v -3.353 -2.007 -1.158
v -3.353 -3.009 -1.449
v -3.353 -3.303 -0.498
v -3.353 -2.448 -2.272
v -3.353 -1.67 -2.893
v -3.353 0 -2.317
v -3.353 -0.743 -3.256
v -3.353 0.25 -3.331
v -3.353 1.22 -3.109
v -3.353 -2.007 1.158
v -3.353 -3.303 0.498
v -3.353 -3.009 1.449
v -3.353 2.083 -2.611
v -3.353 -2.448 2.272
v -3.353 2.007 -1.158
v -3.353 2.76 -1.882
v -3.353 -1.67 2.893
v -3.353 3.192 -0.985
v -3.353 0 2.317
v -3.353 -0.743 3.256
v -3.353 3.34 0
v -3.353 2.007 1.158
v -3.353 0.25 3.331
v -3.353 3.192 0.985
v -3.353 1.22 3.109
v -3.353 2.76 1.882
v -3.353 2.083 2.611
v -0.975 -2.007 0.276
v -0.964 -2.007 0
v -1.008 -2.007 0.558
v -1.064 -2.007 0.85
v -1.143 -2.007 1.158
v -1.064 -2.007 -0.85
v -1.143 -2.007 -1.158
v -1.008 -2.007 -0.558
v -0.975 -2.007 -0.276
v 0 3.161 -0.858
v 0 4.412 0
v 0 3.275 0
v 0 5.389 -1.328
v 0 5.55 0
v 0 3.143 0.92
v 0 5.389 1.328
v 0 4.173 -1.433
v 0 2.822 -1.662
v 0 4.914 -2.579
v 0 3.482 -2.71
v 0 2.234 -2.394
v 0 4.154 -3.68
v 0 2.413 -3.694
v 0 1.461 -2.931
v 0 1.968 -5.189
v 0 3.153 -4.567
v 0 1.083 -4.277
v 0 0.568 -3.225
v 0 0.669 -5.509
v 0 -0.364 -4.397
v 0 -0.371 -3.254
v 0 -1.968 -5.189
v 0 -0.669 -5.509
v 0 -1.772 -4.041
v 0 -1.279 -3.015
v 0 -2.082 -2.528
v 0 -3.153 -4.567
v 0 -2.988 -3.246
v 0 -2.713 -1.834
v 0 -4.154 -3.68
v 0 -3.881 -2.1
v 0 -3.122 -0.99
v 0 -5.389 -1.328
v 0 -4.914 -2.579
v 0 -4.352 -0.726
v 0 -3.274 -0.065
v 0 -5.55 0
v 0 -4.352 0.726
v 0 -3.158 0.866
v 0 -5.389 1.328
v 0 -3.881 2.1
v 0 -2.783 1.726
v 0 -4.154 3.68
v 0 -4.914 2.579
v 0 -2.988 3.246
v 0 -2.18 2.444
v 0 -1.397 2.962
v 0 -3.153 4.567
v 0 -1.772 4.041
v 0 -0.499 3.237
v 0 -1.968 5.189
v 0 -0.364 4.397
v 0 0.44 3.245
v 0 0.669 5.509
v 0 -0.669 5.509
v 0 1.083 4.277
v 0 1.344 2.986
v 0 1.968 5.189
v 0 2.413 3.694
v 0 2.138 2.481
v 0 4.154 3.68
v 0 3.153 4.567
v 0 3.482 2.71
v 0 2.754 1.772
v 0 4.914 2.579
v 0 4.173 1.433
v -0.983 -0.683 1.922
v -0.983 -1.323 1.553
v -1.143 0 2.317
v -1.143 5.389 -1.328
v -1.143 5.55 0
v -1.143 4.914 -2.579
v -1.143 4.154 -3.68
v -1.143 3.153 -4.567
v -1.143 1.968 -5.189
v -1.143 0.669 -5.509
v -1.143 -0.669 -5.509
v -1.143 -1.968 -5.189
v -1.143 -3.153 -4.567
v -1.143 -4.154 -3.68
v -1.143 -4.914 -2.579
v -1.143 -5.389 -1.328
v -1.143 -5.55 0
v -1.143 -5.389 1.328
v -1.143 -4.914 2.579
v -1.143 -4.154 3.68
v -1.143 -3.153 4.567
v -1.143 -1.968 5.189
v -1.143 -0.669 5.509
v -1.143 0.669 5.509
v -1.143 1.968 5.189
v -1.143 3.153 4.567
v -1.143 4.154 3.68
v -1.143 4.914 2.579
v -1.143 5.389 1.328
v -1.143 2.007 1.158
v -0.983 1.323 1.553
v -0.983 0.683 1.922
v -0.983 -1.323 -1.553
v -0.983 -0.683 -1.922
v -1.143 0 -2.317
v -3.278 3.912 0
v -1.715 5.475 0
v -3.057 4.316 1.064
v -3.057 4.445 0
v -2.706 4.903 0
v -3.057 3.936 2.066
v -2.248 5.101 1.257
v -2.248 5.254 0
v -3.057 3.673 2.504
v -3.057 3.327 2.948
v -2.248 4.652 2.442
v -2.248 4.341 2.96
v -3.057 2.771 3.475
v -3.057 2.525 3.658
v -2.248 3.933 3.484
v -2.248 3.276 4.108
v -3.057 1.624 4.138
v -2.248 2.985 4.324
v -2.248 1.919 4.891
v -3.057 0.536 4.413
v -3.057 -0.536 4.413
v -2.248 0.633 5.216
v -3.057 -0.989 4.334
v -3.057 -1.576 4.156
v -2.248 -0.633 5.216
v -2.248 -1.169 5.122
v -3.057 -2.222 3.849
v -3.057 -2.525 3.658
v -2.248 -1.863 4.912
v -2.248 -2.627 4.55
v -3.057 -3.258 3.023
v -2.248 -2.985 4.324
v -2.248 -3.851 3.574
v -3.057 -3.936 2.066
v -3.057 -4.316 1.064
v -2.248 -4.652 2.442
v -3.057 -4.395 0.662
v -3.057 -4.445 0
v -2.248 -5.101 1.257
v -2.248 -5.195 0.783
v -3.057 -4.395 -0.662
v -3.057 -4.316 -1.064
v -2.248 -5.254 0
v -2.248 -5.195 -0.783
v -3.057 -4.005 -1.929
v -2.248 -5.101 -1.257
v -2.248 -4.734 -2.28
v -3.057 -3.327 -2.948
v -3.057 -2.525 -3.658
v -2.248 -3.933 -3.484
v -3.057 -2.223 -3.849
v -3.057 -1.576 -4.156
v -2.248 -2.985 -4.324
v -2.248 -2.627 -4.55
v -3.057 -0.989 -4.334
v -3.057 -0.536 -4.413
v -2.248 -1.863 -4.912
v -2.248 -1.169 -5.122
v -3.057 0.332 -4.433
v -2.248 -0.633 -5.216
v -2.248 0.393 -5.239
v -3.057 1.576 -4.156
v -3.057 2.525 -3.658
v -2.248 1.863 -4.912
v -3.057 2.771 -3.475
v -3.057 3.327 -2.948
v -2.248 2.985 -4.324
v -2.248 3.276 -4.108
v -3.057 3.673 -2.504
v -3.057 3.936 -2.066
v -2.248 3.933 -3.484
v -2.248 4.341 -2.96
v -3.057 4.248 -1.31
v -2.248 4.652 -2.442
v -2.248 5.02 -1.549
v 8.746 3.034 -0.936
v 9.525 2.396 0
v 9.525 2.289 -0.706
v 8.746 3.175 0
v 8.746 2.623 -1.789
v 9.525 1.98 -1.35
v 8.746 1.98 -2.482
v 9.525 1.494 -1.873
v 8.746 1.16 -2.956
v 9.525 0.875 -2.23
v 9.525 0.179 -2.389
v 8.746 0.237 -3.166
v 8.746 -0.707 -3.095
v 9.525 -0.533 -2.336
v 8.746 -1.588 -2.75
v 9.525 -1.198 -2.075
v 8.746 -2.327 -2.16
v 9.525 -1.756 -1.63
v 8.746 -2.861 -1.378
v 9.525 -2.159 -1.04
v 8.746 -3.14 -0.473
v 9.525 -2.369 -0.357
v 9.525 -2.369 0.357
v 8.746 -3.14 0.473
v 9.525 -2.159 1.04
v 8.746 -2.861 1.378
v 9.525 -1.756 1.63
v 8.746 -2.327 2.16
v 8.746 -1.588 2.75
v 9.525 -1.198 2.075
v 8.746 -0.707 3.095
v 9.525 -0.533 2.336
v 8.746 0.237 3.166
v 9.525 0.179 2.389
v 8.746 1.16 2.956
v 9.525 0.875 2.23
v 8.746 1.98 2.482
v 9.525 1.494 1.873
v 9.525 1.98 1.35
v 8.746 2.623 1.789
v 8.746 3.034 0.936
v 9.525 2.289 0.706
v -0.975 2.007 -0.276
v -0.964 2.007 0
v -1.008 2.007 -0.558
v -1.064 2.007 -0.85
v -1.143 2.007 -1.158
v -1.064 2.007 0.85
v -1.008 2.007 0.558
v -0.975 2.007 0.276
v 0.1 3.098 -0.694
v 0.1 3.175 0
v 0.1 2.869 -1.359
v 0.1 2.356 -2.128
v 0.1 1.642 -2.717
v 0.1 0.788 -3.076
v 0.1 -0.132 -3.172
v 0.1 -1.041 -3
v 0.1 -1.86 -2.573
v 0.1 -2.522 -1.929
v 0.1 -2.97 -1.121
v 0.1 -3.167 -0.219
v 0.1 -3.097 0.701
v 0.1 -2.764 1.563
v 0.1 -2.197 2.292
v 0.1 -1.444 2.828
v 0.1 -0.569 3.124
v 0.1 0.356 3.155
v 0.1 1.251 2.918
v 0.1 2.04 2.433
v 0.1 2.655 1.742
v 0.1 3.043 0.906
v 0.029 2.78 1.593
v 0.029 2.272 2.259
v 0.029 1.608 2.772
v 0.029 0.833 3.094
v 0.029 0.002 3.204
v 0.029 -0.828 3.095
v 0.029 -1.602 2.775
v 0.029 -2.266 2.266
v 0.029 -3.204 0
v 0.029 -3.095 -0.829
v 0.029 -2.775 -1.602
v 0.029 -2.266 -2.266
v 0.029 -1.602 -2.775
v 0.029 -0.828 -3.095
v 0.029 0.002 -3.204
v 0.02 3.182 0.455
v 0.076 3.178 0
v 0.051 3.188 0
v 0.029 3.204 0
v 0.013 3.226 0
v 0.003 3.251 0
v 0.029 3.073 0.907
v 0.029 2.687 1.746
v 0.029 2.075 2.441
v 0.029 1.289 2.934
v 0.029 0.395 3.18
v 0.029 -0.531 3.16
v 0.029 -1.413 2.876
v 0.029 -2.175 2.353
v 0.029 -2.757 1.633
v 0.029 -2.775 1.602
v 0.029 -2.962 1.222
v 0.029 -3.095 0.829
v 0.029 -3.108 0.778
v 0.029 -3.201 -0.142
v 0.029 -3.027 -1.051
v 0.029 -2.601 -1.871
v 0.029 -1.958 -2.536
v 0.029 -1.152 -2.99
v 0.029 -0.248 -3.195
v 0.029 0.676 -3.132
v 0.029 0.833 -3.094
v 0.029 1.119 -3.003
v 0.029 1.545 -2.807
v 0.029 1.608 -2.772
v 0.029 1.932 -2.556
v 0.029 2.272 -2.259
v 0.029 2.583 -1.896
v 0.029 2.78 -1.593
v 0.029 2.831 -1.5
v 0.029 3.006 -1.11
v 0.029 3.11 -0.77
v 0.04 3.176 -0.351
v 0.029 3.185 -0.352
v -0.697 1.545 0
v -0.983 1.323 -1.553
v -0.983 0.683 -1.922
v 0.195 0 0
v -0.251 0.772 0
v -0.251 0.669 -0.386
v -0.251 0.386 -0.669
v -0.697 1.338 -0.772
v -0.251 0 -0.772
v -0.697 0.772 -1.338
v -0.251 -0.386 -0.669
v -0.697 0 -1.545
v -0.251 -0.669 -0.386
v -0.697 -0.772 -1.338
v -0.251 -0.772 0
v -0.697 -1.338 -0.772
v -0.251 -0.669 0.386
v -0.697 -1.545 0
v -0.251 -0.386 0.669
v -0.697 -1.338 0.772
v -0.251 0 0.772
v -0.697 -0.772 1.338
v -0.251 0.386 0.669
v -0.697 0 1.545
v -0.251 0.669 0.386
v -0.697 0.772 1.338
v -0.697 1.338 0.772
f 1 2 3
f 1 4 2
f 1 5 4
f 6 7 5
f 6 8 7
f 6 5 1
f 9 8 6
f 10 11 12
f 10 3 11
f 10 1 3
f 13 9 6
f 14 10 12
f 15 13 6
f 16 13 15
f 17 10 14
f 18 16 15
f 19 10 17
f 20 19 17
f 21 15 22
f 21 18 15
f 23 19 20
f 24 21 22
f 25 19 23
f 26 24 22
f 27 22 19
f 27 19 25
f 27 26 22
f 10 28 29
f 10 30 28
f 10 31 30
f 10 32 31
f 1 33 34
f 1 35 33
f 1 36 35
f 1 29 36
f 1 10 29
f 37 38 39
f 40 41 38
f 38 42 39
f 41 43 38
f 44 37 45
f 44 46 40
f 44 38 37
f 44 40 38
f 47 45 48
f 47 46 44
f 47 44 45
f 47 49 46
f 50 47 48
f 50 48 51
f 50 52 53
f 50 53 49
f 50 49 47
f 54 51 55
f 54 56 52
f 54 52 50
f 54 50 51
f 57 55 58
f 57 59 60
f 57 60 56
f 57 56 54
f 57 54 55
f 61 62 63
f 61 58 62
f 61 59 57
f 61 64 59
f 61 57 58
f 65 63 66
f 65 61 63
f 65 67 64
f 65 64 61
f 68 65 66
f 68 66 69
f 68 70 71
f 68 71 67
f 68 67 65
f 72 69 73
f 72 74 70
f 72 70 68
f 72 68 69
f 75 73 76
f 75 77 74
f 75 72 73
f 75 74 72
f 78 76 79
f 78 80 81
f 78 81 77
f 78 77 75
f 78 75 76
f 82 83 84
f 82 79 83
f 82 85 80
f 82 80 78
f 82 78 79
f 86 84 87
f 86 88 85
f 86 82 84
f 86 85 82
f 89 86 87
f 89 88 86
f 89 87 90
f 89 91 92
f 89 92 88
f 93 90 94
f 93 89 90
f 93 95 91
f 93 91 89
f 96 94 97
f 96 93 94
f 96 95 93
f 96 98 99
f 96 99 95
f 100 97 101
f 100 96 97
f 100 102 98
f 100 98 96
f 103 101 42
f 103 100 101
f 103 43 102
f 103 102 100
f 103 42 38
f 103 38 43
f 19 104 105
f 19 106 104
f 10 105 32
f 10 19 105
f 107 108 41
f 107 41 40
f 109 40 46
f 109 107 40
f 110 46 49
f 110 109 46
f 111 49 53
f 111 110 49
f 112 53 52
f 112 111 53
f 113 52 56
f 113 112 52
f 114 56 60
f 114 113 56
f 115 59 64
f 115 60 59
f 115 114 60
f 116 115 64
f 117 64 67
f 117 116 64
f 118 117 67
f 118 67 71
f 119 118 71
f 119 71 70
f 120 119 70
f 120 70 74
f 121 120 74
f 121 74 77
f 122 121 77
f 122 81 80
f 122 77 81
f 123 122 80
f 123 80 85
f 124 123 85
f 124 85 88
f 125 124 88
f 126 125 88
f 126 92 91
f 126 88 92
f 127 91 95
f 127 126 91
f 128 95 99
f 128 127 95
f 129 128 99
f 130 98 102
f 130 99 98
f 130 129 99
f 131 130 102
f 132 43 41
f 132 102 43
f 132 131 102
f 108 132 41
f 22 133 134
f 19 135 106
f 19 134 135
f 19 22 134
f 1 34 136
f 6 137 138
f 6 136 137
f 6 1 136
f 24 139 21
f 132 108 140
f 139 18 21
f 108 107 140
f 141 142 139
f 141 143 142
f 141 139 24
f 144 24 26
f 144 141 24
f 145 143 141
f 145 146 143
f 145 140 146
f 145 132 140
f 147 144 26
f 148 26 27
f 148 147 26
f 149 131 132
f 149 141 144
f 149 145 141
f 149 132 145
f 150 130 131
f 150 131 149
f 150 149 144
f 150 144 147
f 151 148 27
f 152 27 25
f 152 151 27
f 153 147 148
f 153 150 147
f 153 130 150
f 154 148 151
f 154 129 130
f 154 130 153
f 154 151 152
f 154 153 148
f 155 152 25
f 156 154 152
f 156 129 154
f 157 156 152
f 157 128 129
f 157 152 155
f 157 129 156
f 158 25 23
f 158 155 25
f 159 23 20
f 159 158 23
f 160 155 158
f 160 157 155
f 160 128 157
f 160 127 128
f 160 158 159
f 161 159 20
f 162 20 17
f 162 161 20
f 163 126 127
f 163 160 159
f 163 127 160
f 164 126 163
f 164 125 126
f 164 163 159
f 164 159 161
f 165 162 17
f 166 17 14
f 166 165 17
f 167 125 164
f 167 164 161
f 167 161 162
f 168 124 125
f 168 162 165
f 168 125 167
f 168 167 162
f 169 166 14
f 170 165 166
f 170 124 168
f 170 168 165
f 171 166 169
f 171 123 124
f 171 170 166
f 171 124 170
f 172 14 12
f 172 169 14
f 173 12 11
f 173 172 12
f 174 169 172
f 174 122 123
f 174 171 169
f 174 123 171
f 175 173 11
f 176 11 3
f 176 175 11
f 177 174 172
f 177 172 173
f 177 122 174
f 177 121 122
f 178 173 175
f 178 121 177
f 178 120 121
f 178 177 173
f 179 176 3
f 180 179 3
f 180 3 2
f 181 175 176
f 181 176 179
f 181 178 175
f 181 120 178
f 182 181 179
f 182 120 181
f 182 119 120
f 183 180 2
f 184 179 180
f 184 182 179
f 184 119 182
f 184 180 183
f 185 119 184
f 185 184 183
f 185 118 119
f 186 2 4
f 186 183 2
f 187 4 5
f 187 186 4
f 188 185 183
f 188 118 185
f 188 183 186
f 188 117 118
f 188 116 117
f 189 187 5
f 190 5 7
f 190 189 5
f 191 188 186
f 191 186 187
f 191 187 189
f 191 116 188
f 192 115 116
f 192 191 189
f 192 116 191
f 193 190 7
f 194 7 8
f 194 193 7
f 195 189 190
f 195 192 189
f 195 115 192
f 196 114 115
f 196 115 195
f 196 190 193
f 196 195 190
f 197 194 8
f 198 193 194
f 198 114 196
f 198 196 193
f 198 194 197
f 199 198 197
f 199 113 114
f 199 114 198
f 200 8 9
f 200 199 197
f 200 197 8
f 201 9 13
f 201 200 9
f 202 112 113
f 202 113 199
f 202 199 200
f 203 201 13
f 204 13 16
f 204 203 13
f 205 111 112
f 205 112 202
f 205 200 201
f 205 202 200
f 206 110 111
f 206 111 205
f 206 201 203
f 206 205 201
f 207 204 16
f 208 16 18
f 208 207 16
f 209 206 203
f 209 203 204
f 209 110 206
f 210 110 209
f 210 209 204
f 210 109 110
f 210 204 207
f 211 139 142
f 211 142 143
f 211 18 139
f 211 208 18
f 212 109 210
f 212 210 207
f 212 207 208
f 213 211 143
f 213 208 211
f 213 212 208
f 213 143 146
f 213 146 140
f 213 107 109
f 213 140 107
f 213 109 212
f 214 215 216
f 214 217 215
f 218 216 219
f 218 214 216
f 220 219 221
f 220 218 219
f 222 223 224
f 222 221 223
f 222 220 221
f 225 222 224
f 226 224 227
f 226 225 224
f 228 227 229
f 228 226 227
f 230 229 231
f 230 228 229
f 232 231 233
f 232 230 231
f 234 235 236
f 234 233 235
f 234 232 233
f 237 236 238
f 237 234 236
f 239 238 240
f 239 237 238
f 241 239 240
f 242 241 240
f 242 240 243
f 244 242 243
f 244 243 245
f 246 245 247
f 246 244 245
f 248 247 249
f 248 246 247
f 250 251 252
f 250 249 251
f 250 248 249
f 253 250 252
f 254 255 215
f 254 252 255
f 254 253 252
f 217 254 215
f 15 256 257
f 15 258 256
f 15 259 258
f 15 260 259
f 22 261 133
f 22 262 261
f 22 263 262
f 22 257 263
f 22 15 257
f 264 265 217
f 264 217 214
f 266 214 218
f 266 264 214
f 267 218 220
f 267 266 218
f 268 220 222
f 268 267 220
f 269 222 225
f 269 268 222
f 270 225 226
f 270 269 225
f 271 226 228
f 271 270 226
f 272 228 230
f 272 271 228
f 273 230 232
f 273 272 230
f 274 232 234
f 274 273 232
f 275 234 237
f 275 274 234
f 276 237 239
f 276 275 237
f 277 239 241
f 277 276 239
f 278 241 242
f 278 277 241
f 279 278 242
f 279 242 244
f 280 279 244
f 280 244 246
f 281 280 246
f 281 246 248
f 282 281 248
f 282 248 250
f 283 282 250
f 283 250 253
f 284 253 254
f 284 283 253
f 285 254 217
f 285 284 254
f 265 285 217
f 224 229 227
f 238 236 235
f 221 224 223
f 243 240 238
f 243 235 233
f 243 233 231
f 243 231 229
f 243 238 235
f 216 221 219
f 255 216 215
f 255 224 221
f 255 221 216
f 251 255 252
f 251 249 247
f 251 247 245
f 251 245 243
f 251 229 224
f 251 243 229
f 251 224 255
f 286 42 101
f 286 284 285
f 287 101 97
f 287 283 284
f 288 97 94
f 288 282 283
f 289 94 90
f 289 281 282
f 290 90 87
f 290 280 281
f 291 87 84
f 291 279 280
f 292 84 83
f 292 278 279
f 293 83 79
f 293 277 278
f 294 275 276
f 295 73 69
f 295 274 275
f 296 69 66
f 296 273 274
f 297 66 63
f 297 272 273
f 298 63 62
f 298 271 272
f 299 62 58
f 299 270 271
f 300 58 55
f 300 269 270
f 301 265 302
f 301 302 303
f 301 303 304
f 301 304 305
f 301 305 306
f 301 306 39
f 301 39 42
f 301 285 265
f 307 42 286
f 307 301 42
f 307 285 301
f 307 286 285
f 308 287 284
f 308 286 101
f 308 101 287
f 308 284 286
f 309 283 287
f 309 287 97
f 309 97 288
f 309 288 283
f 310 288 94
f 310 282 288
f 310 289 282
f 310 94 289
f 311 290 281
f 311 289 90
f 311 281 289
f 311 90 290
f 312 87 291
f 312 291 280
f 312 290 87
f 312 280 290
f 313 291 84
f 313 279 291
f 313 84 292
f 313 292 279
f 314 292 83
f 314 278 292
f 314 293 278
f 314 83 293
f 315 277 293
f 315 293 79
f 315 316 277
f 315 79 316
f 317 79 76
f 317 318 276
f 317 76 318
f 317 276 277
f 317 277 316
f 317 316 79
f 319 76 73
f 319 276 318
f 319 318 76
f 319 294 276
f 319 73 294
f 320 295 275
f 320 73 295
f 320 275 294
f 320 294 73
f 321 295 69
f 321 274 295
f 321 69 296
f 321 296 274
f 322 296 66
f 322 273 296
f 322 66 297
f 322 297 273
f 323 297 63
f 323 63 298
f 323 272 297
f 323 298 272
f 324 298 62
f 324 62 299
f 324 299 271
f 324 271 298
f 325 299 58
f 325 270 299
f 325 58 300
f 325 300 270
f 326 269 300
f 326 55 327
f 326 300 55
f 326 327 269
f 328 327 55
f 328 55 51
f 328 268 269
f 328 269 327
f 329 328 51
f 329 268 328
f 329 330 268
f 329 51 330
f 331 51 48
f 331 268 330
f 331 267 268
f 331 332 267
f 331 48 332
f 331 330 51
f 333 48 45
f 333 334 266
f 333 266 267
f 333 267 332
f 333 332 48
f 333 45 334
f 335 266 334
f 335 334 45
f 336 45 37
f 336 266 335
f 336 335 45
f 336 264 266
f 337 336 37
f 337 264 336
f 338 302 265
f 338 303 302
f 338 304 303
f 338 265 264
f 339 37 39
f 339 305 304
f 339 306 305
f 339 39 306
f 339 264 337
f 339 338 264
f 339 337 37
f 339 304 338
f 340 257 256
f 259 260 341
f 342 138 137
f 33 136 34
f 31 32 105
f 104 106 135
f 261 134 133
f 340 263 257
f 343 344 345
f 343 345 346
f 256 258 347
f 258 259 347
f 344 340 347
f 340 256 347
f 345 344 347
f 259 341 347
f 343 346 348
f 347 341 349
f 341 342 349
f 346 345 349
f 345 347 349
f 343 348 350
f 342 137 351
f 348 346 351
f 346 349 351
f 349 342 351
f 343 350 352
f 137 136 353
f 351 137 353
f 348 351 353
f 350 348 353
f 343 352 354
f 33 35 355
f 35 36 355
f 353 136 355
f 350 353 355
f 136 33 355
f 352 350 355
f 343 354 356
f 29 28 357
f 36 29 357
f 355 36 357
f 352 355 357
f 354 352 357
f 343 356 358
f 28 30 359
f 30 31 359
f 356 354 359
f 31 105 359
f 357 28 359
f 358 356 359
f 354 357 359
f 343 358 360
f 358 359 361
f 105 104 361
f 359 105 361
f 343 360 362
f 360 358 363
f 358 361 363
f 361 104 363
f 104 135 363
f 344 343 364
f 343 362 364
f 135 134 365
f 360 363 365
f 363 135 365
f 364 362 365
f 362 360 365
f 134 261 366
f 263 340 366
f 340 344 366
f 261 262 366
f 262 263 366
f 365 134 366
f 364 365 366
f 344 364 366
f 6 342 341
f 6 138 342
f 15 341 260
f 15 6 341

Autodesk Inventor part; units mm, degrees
ref_plane "YZ Plane" through (0, 0, 0) normal (1, 0, 0) x (0, 1, 0)
ref_plane "XZ Plane" through (0, 0, 0) normal (0, 1, 0) x (-1, 0, 0)
sketch "Sketch1" plane through (0, 0, 0) normal (0, 0, 1) x (1, 0, 0)
  line L0 (0.1947, 0) -> (9.525, 0)
  line L1 (9.525, 0) -> (9.525, 3.175)
  line L2 (9.525, 3.175) -> (2.4132, 3.175)
  line L3 (2.4132, 3.175) -> (0.0001, 3.175)
  line L4 (0.0001, 3.175) -> (0, 3.175)
  line L5 (0, 3.175) -> (0, 5.5499)
  line L6 (0, 5.5499) -> (-3.3528, 5.5499)
  line L7 (-3.3528, 5.5499) -> (-3.3528, 2.317)
  line L8 (-3.3528, 2.317) -> (-1.143, 2.317)
  line L9 (-1.143, 2.317) -> (0.1947, 0)
  line L10 (-5.9284, 0) -> (12.1006, 0) projected
  line L11 (0, -1.11) -> (0, 6.6599) projected
  line L12 (2.4132, 3.175) -> (0, 3.175) construction
  dimension "d1" = 7.1118
  dimension "d2" = 2.4131
  dimension "d3" = 3.3528
  dimension "d4" = 2.2098
  dimension "d5" = 60
  dimension "d6" = 6.35
  dimension "d7" = 6.35
  dimension "d8" = 4.634
  dimension "d9" = 11.0998
  dimension "d26" = 9.525
revolve "Body" add sketch "Sketch1" angle 360 about axis through (0.1947, 0, 0) along (1, 0, 0) contours L9 L11 L3 L2 L1 L0 | L9 L8 L7 L6 L5 L11
sketch "Sketch2" plane through (-3.3528, 0, 0) normal (-1, 0, 0) x (0, 0, 1)
  circle A0 centre (0, 0) radius 2.317 projected
  line L0 (0, -7.7699) -> (0, 7.7699) projected
  line L1 (-7.7699, 0) -> (7.7699, 0) projected
  line L2 (2.317, 0) -> (1.1585, -2.0066)
  line L3 (1.1585, -2.0066) -> (-1.1585, -2.0066)
  line L4 (-1.1585, -2.0066) -> (-2.317, 0)
  line L5 (-2.317, 0) -> (-1.1585, 2.0066)
  line L6 (-1.1585, 2.0066) -> (1.1585, 2.0066)
  line L7 (1.1585, 2.0066) -> (2.317, 0)
extrude "Slot" add sketch "Sketch2" against normal up to next contours L7 A0 | A0 L2 | L6 L0 A0 | A0 L0 L3 | L0 L6 A0 | A0 L3 L0 | L4 A0 | A0 L5
fillet "Fillet1" radius 2.2098 1 edges at (-3.3528, -5.5499, 0)
thread "Thread" size "1/4-20 UNC" class "2A" standard "ANSI Unified Screw Threads" length 7.1118
chamfer "Chamfer1" distance 0.7791 distance2 0.779 1 edges at (9.525, -3.175, 0) measured on face at (9.525, 1.7119, 1.0506)
ref_plane "Work Plane1" through (29, 0, 0) normal (0, -1, 0) x (1, 0, 0)
fillet "Fillet2" radius 0.1 1 edges at (0.0001, -3.175, 0)
equation "\"d1\" = GEL"
equation "\"d3\" = KOH"
equation "\"d4\" = INTI"
equation "\"d6\" = GD"
equation "\"d7\" = BDM"
equation "\"d8\" = 1.1547 * SW"
equation "\"d9\" = KOD"
equation "\"d26\" = NLG"
equation "\"d30\" = R"
equation "\"d17\" = RR"
equation "\"d13\" = GEL"
equation "\"d15\" = -0.5 * SPD + 0.5 * GD"
equation "\"d16\" = GUL"
equation "\"GD\" = NND"
equation "\"NLG\" = 9.525"
equation "\"GEL\" = 7.1118"
equation "\"KOD\" = 11.0998"
equation "\"KOH\" = 3.3528"
equation "\"INTI\" = 2.2098"
equation "\"GAL\" = 2.413"
equation "\"GUL\" = 0.77902"
equation "\"BDM\" = NND"
equation "\"SW\" = 4.0132"
equation "\"RR\" = 2.2098"
equation "\"SPD\" = GD1"
equation "\"R\" = 0.1"
equation "\"KR\" = 6.3246"
equation "\"GD1\" = 4.79188"
equation "\"THREADDIA\" = 6.35"
equation "\"FAWI\" = 45deg"
equation "\"KOH1\" = 2.2098"
equation "\"NND\" = 6.35"
equation "\"TOA\" = 30deg"
equation "\"E0\" = 1.155 * SW"
properties part number "Unbrako - 1/4 x 3/8" material "Steel, Mild"
